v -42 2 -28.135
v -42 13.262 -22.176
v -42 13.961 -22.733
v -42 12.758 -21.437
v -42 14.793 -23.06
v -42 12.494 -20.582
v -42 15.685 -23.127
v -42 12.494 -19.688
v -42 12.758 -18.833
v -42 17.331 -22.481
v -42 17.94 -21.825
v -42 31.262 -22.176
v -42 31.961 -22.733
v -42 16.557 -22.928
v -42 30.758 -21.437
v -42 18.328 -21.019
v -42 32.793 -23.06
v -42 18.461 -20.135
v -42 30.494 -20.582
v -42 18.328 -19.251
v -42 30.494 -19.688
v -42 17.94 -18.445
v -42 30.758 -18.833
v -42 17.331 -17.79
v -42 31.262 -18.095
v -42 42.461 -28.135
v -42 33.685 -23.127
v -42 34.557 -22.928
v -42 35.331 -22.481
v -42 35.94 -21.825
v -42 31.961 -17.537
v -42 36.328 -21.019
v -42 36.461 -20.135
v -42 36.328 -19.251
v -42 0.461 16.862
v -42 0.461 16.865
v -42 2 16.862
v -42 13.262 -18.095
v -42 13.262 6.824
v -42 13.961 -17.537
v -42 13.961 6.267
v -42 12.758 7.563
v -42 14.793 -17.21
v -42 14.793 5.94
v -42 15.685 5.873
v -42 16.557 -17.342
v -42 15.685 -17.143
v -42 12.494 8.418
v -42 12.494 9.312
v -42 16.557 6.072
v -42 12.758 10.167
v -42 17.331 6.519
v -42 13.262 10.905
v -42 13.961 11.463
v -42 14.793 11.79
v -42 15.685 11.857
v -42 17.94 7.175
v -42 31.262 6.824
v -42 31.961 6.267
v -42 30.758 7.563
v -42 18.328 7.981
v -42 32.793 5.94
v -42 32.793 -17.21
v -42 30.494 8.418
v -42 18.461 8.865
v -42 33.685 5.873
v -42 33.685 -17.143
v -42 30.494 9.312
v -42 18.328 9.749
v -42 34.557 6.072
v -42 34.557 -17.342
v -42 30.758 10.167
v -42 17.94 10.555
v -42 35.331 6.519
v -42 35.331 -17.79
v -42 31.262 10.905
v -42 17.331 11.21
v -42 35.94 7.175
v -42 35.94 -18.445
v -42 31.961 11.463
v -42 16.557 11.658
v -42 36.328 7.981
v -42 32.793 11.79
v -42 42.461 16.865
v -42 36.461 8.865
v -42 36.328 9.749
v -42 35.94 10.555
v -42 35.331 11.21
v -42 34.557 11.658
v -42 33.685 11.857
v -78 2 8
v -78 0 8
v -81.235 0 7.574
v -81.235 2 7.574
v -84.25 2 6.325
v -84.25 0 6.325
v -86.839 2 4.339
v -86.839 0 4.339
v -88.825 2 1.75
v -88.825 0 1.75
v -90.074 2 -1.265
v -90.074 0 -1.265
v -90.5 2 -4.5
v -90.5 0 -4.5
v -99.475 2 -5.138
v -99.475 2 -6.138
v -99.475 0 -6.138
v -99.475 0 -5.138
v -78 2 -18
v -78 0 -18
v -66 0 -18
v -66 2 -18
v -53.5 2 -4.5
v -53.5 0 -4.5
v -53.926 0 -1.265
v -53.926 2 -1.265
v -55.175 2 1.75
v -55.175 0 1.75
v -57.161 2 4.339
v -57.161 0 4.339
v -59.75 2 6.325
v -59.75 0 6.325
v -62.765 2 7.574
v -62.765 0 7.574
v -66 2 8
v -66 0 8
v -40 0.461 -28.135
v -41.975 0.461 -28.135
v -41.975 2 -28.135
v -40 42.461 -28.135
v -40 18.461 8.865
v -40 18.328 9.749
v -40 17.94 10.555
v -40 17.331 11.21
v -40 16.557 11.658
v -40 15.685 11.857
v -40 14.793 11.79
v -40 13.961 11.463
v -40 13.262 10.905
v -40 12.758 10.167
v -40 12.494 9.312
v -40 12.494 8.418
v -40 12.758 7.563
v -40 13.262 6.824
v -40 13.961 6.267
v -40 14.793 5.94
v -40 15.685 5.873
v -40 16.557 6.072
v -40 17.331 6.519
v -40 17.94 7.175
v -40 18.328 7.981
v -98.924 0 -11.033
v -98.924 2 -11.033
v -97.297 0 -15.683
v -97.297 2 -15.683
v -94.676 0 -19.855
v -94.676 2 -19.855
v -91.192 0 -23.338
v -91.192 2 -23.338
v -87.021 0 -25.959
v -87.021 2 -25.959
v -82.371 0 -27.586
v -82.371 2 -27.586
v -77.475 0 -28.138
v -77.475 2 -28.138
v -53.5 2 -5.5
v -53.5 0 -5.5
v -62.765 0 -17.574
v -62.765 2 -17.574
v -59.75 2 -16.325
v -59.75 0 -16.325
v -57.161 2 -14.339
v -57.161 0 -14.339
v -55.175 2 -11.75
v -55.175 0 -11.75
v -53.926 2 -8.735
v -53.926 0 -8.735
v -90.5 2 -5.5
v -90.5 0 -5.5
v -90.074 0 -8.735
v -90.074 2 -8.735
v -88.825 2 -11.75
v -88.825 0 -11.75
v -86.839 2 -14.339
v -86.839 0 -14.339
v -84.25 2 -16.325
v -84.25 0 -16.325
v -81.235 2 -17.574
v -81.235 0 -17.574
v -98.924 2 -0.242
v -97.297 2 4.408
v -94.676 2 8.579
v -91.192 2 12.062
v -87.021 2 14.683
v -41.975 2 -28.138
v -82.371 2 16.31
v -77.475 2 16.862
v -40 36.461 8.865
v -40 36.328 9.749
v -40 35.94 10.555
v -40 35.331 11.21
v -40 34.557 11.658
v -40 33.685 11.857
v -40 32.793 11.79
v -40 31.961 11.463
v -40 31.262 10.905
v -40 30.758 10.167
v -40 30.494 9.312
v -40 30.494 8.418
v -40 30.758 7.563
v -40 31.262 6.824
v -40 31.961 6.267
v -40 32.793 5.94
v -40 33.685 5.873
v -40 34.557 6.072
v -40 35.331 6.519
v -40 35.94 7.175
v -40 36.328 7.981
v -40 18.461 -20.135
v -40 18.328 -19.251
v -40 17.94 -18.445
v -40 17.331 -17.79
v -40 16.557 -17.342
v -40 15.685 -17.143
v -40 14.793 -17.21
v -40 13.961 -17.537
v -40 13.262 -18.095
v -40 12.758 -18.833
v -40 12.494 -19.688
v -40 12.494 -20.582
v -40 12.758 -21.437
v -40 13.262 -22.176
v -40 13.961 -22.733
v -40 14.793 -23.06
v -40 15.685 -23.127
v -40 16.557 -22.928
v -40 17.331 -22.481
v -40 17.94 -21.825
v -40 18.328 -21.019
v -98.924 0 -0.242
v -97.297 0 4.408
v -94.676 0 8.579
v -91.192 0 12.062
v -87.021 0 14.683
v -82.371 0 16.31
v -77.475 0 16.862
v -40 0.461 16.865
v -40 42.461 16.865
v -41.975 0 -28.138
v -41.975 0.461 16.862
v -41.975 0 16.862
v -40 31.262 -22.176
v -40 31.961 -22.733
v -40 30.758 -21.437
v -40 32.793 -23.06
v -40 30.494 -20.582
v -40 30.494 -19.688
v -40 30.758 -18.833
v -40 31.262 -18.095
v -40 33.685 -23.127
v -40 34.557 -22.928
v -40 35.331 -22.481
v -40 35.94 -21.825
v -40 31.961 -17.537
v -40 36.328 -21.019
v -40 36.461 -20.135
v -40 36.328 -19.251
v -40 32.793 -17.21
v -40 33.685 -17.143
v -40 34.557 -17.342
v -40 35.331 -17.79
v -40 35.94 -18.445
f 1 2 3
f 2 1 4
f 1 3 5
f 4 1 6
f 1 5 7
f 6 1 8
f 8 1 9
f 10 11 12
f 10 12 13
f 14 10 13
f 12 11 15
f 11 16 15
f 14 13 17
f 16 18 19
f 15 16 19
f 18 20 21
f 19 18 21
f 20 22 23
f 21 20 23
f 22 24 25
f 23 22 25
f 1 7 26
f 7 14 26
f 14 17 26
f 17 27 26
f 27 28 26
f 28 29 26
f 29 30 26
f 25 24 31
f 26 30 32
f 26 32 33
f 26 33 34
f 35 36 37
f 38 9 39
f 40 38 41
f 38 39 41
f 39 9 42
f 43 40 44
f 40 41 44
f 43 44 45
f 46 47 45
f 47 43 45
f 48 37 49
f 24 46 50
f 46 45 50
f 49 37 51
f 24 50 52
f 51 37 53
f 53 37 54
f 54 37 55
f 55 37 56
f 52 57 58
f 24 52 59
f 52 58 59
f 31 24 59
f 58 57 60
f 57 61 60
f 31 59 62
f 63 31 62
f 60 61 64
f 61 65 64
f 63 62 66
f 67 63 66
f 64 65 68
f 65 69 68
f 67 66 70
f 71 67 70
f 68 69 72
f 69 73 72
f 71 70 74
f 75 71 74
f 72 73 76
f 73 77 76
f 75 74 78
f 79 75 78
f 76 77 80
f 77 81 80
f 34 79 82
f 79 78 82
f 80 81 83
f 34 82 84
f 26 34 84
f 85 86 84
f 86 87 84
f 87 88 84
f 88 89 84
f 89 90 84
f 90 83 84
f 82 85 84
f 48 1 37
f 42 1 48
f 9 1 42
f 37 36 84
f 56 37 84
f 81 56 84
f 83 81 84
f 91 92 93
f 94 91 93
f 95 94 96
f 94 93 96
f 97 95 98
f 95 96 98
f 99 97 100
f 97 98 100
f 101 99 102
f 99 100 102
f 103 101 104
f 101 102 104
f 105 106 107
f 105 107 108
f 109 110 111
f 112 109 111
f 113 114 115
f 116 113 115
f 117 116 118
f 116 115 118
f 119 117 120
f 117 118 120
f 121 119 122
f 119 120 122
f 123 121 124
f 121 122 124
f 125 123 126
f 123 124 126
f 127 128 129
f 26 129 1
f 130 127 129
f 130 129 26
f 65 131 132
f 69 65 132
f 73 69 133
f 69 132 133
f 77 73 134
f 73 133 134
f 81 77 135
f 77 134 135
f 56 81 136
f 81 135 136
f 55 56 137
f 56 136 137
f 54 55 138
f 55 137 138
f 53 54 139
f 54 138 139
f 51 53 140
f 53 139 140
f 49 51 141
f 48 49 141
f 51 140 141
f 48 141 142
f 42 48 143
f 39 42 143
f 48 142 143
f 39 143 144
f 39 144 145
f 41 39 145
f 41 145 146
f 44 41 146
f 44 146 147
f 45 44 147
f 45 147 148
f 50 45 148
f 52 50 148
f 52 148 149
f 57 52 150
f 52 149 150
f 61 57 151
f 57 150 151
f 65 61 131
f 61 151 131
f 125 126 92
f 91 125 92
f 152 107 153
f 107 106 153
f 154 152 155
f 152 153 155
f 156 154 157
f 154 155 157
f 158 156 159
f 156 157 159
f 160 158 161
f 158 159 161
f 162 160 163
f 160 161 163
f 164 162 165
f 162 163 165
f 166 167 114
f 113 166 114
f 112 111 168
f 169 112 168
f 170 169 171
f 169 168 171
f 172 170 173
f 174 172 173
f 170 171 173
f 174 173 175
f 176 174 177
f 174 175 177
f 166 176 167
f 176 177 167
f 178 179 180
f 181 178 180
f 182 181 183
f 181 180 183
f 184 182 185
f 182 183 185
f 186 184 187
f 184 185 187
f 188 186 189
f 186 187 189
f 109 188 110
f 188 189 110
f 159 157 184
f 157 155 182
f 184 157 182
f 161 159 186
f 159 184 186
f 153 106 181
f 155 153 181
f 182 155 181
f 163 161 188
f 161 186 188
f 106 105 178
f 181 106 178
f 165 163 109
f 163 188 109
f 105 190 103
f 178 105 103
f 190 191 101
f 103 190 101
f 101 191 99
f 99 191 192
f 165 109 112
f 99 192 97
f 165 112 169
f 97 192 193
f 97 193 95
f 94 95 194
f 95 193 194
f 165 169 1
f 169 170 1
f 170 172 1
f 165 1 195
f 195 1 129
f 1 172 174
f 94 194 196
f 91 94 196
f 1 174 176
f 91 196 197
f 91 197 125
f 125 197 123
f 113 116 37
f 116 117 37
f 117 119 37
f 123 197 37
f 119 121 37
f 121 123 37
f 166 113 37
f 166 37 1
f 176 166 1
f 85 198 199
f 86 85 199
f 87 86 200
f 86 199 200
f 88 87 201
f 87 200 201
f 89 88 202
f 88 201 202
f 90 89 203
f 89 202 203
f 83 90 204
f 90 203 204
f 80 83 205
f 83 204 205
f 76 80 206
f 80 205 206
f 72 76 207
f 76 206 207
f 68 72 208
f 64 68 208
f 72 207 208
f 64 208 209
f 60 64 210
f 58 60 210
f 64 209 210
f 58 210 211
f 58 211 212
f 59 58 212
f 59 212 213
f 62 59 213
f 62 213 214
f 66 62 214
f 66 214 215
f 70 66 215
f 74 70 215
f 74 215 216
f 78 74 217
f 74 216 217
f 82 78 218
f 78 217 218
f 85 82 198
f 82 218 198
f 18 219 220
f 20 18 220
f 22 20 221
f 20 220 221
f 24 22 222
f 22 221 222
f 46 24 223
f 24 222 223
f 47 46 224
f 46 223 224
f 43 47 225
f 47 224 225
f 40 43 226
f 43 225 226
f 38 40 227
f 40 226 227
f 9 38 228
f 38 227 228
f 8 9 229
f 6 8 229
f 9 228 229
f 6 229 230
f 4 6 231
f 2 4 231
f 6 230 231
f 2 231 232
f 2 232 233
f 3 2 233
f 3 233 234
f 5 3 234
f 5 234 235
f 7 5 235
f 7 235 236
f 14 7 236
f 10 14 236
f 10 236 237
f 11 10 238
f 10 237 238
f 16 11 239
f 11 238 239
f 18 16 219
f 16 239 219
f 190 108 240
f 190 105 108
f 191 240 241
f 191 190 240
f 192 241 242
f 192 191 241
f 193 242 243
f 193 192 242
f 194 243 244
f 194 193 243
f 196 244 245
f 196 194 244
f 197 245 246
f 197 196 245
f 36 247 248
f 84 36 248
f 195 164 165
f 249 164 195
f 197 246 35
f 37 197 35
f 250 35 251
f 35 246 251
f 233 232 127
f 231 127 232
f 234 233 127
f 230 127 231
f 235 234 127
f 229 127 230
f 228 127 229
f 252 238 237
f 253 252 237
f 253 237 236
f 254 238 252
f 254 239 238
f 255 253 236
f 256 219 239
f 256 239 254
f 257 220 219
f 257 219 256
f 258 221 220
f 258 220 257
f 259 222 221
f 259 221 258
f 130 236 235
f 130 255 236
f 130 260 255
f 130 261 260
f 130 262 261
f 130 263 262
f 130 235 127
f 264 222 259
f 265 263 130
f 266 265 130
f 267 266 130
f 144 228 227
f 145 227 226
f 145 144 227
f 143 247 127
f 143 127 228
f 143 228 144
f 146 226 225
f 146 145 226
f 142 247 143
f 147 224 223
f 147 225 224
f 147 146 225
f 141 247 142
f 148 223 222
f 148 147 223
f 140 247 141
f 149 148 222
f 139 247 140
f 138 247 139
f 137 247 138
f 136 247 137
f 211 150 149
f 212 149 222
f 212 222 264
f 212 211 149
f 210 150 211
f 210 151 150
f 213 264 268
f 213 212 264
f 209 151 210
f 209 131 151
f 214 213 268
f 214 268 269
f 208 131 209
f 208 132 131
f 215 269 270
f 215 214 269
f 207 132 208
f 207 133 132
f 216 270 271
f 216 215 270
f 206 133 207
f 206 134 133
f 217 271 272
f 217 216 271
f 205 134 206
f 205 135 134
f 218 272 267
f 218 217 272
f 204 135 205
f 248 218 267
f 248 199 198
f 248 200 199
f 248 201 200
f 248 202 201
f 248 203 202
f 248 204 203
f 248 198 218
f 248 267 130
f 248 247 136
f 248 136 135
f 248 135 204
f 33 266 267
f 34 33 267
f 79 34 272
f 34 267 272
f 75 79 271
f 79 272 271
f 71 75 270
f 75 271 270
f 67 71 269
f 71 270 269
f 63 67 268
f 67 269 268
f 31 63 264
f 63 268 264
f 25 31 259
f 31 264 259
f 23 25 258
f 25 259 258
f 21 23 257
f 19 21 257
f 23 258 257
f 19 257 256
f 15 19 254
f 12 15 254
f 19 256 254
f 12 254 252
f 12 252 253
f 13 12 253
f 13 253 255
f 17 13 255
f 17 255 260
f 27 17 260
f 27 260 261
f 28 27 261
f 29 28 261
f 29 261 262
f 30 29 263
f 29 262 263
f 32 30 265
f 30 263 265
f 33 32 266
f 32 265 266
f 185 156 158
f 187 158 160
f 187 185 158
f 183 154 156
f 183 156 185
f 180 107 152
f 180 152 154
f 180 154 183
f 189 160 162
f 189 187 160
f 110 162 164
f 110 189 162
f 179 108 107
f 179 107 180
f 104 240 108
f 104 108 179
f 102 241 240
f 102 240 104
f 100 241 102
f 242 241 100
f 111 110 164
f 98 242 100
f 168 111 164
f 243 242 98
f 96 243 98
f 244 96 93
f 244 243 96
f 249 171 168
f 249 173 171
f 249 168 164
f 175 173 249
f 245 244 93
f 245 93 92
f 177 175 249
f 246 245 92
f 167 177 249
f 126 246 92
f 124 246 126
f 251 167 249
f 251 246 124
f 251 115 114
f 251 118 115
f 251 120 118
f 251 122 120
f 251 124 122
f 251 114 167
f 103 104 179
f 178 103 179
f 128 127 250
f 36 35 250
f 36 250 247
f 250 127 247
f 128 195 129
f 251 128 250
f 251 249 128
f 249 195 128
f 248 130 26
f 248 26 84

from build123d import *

# Parameters (mm, degrees)
SKETCH017_W  = 42
SKETCH017_H  = 45
SKETCH017_R  = 3
PAD012_DEPTH = 2
SKETCH018_W  = 57.5
SKETCH018_H  = 45
PAD013_DEPTH = 2
FILLET_R     = 22


with BuildPart() as part:
    # Sketch017 → Pad012 (new body)
    with BuildSketch(Plane(origin=(-40, 3, -3), x_dir=(0, 1, 0), z_dir=(1, 0, 0))):
        with Locations((18.460948, -2.635084)):
            Rectangle(SKETCH017_W, SKETCH017_H)
        with Locations((12.460948, 11.864916)):
            Circle(SKETCH017_R, mode=Mode.SUBTRACT)
        with Locations((30.460948, 11.864916)):
            Circle(SKETCH017_R, mode=Mode.SUBTRACT)
        with Locations((30.460948, -17.135084)):
            Circle(SKETCH017_R, mode=Mode.SUBTRACT)
        with Locations((12.460948, -17.135084)):
            Circle(SKETCH017_R, mode=Mode.SUBTRACT)
    extrude(amount=-PAD012_DEPTH)

    # Sketch018 → Pad013 (join)
    with BuildSketch(Plane(origin=(-21, 0, -3), x_dir=(1, 0, 0), z_dir=(0, -1, 0))):
        with Locations((-49.725473, -2.637928)):
            Rectangle(SKETCH018_W, SKETCH018_H)
        with BuildLine():
            Line((-57, -15), (-45, -15))
            ThreePointArc((-45, -15), (-36.161165, -11.338835), (-32.5, -2.5))
            Line((-32.5, -2.5), (-32.5, -1.5))
            ThreePointArc((-32.5, -1.5), (-36.161165, 7.338835), (-45, 11))
            Line((-45, 11), (-57, 11))
            ThreePointArc((-57, 11), (-65.838835, 7.338835), (-69.5, -1.5))
            Line((-69.5, -1.5), (-69.5, -2.5))
            ThreePointArc((-69.5, -2.5), (-65.838835, -11.338835), (-57, -15))
        make_face(mode=Mode.SUBTRACT)
    extrude(amount=-PAD013_DEPTH)

    # Fillet
    fillet_edges = [part.edges().sort_by_distance(p)[0] for p in [
        (-99.475473, 1, -28.137928),
        (-99.475473, 1, 16.862072),
    ]]
    fillet(fillet_edges, radius=FILLET_R)


solid = part.part
